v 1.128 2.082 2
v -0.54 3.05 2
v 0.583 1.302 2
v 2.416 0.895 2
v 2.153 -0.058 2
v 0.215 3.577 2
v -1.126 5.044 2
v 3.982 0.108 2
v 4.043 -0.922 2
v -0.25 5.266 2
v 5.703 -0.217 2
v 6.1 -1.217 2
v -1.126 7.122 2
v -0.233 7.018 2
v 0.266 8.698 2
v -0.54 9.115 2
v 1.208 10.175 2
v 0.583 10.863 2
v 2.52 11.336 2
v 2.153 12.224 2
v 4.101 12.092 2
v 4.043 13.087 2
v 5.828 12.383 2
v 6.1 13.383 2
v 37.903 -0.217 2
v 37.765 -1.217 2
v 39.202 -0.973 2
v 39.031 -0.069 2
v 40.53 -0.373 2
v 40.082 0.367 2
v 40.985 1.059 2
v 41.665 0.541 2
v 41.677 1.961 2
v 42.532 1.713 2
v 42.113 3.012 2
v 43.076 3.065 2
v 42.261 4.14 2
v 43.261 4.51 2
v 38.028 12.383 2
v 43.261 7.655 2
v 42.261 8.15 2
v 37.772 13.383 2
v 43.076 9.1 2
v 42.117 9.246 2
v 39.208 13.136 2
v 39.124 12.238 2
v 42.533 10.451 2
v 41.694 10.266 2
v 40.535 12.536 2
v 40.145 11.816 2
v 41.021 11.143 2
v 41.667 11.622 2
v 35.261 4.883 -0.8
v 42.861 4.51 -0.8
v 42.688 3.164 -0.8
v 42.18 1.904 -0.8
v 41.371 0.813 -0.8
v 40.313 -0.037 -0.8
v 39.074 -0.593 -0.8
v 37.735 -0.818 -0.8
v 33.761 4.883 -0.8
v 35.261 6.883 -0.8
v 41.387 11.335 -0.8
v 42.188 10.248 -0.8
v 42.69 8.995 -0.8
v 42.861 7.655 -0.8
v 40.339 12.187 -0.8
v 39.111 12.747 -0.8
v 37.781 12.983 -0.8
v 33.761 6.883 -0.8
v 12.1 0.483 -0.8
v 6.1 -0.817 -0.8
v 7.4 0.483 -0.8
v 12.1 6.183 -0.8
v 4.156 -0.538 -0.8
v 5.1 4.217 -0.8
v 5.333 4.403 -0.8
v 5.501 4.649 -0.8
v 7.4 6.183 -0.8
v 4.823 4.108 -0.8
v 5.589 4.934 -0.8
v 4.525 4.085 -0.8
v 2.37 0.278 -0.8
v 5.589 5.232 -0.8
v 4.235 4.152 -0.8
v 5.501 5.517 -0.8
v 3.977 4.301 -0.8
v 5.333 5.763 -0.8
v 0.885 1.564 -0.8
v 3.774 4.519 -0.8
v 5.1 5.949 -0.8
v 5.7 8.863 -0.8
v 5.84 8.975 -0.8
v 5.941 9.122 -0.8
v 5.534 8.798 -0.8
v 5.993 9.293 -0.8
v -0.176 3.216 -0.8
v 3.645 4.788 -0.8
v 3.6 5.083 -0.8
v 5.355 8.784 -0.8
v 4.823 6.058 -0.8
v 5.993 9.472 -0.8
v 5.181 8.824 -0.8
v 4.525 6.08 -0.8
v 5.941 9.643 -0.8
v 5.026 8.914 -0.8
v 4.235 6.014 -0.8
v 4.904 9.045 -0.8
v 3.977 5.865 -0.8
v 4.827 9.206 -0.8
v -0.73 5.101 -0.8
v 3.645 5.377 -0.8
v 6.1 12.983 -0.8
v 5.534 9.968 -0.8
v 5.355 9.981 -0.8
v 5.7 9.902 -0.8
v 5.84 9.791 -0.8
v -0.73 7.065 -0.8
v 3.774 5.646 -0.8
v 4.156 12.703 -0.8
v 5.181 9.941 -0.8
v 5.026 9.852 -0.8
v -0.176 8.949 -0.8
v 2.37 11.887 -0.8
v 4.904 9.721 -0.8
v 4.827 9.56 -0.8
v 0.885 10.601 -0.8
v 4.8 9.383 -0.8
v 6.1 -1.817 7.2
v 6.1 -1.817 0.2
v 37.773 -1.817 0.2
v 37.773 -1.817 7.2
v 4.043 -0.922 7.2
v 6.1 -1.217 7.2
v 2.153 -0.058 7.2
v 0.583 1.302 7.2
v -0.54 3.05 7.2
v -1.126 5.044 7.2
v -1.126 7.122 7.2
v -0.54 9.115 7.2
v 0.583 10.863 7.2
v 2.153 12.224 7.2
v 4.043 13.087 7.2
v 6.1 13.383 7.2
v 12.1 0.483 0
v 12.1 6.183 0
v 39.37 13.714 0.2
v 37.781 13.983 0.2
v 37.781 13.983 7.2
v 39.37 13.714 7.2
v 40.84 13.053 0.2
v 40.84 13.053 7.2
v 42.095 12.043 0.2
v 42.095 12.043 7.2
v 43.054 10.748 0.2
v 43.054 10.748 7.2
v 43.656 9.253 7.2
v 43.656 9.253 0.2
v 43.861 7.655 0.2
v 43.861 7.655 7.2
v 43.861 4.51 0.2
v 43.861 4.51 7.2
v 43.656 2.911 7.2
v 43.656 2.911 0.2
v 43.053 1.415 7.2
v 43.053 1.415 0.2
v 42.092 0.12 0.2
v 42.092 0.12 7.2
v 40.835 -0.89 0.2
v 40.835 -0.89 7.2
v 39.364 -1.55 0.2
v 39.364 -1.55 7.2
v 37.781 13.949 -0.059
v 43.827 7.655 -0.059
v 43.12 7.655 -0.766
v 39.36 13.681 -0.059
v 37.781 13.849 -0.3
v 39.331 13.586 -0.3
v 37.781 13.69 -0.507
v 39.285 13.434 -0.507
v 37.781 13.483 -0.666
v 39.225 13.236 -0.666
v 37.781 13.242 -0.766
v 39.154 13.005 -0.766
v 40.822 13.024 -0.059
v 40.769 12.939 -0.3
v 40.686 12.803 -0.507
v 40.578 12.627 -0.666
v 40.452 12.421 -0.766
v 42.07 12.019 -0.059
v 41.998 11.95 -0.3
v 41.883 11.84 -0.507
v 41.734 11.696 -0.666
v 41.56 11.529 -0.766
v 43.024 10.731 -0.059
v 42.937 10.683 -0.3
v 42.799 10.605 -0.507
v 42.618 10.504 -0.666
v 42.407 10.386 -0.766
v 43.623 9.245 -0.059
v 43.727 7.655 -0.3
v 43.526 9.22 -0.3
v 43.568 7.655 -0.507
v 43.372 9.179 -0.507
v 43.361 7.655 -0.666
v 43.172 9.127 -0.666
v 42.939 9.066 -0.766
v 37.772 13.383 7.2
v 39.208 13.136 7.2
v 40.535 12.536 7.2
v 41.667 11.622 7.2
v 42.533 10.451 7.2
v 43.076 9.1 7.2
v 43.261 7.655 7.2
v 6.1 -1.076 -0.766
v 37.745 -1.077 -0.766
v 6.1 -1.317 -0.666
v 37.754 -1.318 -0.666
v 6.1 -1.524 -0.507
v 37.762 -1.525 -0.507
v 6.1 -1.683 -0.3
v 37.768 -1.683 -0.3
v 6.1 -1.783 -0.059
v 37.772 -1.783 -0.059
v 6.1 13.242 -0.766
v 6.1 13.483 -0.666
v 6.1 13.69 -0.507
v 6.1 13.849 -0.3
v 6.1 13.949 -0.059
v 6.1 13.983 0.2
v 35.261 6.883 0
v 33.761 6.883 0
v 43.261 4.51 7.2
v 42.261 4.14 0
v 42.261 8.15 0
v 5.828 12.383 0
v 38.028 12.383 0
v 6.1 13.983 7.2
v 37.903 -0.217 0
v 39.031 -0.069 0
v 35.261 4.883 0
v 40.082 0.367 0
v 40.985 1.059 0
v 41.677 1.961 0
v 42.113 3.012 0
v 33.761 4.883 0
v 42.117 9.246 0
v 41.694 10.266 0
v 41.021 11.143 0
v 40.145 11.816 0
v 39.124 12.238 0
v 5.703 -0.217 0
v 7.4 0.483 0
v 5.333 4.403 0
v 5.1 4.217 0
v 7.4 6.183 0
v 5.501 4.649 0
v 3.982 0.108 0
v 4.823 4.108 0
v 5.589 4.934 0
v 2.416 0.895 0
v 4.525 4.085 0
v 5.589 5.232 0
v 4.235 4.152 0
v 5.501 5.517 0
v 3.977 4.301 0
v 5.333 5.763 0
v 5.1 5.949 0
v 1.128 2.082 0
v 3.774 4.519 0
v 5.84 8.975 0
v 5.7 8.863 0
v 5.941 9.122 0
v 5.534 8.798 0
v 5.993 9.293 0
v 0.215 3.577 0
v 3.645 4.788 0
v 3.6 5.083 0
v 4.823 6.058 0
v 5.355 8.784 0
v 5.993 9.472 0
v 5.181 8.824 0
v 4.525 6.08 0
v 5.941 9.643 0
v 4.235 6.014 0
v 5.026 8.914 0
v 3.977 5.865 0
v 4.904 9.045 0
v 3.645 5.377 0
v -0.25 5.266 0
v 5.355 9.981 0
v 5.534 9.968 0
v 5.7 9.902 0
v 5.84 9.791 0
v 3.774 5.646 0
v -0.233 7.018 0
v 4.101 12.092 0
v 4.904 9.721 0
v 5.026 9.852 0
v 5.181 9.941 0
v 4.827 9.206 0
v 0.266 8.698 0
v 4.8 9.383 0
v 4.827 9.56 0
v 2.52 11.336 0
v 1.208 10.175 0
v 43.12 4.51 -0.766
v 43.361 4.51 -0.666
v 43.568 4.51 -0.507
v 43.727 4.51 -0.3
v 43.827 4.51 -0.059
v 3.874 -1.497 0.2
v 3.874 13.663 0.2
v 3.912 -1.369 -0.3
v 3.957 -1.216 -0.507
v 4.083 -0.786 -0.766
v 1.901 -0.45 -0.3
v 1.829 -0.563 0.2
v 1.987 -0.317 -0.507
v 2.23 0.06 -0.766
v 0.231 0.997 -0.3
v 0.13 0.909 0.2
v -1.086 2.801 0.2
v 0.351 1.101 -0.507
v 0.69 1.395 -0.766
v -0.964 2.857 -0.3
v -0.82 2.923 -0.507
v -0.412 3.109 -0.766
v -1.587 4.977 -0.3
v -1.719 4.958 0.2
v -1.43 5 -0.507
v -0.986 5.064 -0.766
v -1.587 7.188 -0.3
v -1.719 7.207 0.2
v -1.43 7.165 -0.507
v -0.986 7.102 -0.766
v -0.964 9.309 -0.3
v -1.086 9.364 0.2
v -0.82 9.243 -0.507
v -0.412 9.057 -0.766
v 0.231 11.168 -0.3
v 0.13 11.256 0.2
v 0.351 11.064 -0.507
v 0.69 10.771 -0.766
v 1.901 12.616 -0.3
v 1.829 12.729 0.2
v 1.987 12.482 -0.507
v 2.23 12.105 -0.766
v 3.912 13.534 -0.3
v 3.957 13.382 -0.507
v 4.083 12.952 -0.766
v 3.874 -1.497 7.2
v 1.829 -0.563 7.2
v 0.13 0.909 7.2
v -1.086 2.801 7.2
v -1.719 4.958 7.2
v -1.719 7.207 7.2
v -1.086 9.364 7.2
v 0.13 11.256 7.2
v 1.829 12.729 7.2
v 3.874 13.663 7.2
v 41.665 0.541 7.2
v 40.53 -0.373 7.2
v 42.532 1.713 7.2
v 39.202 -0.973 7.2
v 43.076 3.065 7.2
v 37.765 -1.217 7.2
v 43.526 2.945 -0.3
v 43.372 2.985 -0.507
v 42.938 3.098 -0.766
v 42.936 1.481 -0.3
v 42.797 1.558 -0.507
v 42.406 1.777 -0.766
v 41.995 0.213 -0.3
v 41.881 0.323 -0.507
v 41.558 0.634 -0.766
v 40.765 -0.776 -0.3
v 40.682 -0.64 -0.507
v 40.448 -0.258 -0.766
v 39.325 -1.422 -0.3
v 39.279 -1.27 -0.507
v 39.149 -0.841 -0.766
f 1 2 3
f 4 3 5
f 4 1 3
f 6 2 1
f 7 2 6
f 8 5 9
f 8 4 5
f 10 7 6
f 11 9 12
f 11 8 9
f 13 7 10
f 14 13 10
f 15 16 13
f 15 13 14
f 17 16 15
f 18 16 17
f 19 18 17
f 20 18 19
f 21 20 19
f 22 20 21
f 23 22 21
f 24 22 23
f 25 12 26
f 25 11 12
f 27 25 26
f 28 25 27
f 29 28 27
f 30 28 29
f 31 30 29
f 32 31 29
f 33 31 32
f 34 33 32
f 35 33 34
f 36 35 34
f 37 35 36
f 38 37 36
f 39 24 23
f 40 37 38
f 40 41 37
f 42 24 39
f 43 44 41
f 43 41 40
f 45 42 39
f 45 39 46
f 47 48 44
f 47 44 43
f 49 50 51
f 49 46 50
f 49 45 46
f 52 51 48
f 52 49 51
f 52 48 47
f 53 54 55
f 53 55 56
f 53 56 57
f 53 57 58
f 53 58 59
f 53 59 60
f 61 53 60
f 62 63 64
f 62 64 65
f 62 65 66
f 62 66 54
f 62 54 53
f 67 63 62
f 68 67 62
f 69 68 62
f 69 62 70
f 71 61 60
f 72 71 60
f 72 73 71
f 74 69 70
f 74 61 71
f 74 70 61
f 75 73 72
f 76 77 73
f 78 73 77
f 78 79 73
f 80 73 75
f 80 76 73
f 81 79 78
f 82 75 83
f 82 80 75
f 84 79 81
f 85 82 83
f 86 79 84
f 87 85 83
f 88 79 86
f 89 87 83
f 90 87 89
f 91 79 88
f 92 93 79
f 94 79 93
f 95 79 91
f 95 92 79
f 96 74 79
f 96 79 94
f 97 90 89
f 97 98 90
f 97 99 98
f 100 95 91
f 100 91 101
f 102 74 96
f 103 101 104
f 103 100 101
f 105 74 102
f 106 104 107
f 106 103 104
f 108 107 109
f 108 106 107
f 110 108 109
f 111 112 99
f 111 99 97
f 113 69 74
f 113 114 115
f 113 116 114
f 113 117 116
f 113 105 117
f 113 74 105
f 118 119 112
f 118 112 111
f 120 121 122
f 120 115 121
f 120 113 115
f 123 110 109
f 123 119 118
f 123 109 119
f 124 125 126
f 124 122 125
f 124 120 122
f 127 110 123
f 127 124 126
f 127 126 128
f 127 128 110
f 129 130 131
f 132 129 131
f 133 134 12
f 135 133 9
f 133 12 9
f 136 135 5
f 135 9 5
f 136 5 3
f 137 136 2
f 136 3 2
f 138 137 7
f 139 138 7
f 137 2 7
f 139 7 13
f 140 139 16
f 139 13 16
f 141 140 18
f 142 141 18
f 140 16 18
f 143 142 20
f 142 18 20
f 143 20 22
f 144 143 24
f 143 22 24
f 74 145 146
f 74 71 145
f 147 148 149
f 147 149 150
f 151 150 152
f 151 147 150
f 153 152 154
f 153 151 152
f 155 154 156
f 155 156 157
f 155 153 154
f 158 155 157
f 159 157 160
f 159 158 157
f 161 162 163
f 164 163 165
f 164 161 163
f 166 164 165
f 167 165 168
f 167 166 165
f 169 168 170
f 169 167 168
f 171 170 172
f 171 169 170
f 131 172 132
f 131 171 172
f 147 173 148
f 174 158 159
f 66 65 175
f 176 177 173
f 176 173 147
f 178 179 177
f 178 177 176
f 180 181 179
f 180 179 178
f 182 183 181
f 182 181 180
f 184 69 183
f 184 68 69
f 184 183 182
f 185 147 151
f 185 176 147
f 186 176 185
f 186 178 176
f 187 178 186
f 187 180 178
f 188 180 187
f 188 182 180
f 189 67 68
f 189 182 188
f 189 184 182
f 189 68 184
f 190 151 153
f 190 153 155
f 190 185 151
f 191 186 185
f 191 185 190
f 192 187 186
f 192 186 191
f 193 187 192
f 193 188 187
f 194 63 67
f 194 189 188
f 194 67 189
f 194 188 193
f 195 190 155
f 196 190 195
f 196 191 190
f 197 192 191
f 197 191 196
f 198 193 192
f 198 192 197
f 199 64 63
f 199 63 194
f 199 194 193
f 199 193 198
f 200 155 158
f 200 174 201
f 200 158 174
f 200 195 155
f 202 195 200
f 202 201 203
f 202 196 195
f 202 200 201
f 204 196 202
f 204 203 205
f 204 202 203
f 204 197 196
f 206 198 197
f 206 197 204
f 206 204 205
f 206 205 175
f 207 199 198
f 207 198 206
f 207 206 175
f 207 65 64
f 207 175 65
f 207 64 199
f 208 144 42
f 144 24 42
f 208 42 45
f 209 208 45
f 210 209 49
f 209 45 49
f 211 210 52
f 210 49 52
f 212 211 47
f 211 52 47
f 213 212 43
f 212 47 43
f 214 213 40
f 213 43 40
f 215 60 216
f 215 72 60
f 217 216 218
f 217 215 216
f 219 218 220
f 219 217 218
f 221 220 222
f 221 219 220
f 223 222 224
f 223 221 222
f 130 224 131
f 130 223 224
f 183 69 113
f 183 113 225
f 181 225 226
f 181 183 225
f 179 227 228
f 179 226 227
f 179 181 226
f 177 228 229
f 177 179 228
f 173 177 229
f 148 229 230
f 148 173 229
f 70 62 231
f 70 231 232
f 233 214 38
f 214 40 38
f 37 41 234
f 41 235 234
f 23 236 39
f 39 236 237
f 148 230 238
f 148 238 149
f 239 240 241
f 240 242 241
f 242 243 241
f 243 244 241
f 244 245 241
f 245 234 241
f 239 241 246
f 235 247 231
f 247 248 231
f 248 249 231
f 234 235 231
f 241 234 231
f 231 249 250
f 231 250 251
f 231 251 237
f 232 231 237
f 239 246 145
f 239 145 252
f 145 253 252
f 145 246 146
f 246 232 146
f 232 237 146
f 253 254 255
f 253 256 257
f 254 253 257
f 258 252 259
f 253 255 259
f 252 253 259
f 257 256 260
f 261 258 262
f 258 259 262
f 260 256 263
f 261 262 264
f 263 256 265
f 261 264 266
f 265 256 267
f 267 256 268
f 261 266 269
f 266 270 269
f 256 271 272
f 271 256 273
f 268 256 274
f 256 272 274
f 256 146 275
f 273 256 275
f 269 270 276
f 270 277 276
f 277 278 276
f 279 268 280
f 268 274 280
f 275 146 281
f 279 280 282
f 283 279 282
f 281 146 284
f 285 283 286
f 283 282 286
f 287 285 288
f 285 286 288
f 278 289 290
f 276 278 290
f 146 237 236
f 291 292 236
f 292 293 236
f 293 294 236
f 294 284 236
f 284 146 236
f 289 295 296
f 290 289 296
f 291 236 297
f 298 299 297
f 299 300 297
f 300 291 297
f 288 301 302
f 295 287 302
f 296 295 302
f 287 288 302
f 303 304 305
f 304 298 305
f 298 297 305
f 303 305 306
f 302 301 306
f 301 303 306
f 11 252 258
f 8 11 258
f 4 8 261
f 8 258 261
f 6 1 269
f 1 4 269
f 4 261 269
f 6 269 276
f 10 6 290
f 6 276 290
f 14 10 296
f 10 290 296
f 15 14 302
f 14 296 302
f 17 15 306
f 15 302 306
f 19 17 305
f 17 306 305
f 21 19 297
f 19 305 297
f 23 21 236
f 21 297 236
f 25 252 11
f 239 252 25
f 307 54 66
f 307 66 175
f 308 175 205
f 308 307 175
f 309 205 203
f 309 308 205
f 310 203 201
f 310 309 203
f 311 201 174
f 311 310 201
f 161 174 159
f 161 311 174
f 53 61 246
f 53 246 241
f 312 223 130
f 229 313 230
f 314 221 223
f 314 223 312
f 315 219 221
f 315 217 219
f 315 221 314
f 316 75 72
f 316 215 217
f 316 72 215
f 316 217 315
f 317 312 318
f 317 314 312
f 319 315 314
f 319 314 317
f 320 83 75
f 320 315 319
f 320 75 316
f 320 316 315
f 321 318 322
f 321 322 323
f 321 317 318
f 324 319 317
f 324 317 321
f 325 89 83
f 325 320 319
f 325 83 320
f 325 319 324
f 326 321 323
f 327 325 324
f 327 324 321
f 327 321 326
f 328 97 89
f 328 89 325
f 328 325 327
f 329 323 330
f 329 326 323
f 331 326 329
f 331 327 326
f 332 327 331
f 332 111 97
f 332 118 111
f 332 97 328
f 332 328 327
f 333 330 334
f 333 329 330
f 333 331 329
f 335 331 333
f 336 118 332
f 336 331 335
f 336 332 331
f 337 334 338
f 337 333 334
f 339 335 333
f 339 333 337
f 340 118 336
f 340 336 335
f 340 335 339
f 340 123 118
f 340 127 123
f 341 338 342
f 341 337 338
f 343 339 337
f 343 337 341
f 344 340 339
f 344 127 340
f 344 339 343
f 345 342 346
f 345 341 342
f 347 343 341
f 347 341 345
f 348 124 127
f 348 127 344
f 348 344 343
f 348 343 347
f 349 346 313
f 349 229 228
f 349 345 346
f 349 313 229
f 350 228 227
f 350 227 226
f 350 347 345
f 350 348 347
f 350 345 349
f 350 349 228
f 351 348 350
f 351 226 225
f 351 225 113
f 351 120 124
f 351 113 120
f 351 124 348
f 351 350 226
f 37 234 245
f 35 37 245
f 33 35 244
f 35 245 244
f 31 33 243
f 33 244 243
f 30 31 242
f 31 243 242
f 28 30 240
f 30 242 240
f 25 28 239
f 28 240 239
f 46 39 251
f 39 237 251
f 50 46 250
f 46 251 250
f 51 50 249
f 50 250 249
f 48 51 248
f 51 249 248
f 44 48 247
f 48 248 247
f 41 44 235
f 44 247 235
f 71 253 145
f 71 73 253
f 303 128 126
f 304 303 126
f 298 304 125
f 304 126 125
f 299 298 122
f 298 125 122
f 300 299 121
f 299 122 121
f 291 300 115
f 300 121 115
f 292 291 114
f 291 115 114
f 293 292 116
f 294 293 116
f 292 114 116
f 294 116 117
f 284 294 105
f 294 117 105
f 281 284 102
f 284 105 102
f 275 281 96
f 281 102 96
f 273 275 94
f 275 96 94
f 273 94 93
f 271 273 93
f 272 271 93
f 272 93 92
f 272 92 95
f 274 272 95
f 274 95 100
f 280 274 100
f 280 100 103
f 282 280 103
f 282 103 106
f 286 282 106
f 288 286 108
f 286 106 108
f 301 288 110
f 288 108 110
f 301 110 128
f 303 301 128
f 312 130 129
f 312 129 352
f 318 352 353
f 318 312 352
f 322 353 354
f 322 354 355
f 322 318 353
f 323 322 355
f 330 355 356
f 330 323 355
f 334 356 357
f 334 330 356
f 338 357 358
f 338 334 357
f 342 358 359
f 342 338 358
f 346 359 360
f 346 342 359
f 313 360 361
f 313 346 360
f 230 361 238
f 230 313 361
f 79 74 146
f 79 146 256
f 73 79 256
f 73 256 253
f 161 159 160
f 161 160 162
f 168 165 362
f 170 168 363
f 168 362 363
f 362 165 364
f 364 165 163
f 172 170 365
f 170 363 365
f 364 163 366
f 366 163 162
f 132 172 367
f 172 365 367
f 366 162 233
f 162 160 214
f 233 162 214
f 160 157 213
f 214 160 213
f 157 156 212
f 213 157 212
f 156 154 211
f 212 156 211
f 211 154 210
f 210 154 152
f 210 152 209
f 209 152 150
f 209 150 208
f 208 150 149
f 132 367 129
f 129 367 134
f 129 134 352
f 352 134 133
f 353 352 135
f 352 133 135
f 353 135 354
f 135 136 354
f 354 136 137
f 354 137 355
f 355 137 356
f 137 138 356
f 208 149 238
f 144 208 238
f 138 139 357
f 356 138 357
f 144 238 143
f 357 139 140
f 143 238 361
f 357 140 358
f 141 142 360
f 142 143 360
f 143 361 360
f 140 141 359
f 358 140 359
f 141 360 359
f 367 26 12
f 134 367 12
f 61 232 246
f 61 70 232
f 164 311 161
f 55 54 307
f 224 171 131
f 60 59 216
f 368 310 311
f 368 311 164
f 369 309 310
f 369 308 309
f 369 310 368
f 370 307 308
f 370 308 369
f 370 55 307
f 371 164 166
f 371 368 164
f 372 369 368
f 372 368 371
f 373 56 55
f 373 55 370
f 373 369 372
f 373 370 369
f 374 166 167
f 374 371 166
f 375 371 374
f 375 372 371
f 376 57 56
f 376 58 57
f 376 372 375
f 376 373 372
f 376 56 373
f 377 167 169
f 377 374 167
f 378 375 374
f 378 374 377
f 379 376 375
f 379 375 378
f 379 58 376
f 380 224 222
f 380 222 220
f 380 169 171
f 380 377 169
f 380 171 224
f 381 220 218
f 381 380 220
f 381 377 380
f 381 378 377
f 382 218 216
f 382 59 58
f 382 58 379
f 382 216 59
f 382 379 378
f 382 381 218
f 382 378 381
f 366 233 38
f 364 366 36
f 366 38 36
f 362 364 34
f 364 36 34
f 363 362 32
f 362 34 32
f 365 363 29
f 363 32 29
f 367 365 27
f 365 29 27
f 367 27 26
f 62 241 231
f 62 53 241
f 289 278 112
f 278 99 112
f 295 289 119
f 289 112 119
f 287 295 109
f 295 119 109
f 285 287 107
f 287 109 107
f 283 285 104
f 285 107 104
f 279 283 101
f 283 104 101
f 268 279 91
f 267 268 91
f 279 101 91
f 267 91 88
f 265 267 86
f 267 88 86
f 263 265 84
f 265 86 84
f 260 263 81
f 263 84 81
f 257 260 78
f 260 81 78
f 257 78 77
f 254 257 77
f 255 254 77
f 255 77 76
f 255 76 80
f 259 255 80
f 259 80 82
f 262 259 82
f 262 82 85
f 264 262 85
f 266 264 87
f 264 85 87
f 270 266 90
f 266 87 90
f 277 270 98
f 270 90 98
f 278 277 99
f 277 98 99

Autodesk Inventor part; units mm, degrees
ref_plane "YZ Plane" through (0, 0, 0) normal (1, 0, 0) x (0, 1, 0)
ref_plane "XZ Plane" through (0, 0, 0) normal (0, 1, 0) x (-1, 0, 0)
ref_plane "XY Plane" through (0, 0, 0) normal (0, 0, 1) x (1, 0, 0)
sketch "Эскиз1" plane through (0, 0, 0) normal (0, 0, 1) x (1, 0, 0)
  arc A0 (37.9034, -0.2173) -> (42.261, 4.1403) centre (37.9034, 4.1403) ccw
  arc A1 (42.261, 8.15) -> (38.0283, 12.3827) centre (38.0283, 8.15) ccw
  arc A2 (43.261, 7.6552) -> (37.7725, 13.3827) centre (37.5283, 7.6552) ccw
  arc A3 (37.765, -1.2173) -> (43.261, 4.5105) centre (37.5283, 4.5105) ccw
  line L0 (37.765, -1.2173) -> (6.1001, -1.2173)
  line L1 (5.7034, -0.2173) -> (37.9034, -0.2173)
  line L2 (5.8283, 12.3827) -> (5.7034, -0.2173) construction
  arc A4 (5.8283, 12.3827) -> (5.7034, -0.2173) centre (6.0021, 6.0803) ccw
  arc A5 (6.1001, 13.3827) -> (6.1001, -1.2173) centre (6.1001, 6.0827) ccw
  line L3 (5.8283, 12.3827) -> (38.0283, 12.3827)
  line L4 (5.8283, 12.3827) -> (18.4289, 12.3827) construction
  line L5 (37.7725, 13.3827) -> (6.1001, 13.3827)
  line L6 (42.261, 8.15) -> (42.261, 4.1403)
  line L7 (43.261, 7.6552) -> (43.261, 4.5105)
  point P0 (0, 0)
  point P1 (0, 0)
  point P2 (0, 0)
  dimension "d10" = 1.5
  dimension "d0" = 90.568
  dimension "d1" = 4.2327
  dimension "d2" = 5.7327
  dimension "d3" = 5.7327
  dimension "d4" = 1
  dimension "d5" = 1
  dimension "d6" = 12.6
  dimension "d7" = 32.2
  dimension "d8" = 32.2
  dimension "d9" = 1
extrude "main_walls" add sketch "Эскиз1" along normal blind 2
sketch "Эскиз2" plane through (0, 0, 0) normal (0, 0, -1) x (-1, 0, 0)
  line L0 (-6.1001, 13.3827) -> (-37.7725, 13.3827) projected
  arc A0 (-37.7725, 13.3827) -> (-43.261, 7.6552) centre (-37.5283, 7.6552) ccw projected
  line L1 (-43.261, 7.6552) -> (-43.261, 4.5105) projected
  arc A1 (-43.261, 4.5105) -> (-37.765, -1.2173) centre (-37.5283, 4.5105) ccw projected
  line L2 (-37.765, -1.2173) -> (-6.1001, -1.2173) projected
  arc A2 (-6.1001, -1.2173) -> (-6.1001, 13.3827) centre (-6.1001, 6.0827) ccw projected
  point P0 (0, 0)
extrude "top" add sketch "Эскиз2" along normal blind 0.8
sketch "Эскиз3" plane through (0, 0, -0.8) normal (0, 0, -1) x (-1, 0, 0)
  line L0 (-6.1001, 13.3827) -> (-37.7725, 13.3827) projected
  arc A0 (-37.7725, 13.3827) -> (-43.261, 7.6552) centre (-37.5283, 7.6552) ccw projected
  line L1 (-43.261, 7.6552) -> (-43.261, 4.5105) projected
  arc A1 (-43.261, 4.5105) -> (-37.765, -1.2173) centre (-37.5283, 4.5105) ccw projected
  line L2 (-37.765, -1.2173) -> (-6.1001, -1.2173) projected
  arc A2 (-6.1001, -1.2173) -> (-6.1001, 13.3827) centre (-6.1001, 6.0827) ccw projected
  line L3 (1.1999, -1.8994) -> (1.1999, 13.1826)
  line L4 (-7.4001, 0.4827) -> (-12.1001, 0.4827)
  line L5 (-12.1001, 0.4827) -> (-12.1001, 6.1827)
  line L6 (-12.1001, 6.1827) -> (-7.4001, 6.1827)
  line L7 (-7.4001, 6.1827) -> (-7.4001, 0.4827)
  circle A3 centre (-4.6001, 5.0827) radius 1
  circle A4 centre (-5.4001, 9.3827) radius 0.6
  line L8 (-33.761, 4.8827) -> (-35.261, 4.8827)
  line L9 (-35.261, 4.8827) -> (-35.261, 6.8827)
  line L10 (-35.261, 6.8827) -> (-33.761, 6.8827)
  line L11 (-33.761, 6.8827) -> (-33.761, 4.8827)
  point P0 (0, 0)
  dimension "d15" = 4.7
  dimension "d16" = 5.7
  dimension "d17" = 1.7
  dimension "d18" = 2
  dimension "d19" = 1.2
  dimension "d20" = 5.8
  dimension "d21" = 2.8
  dimension "d22" = 6.3
  dimension "d23" = 4
  dimension "d24" = 0.8
  dimension "d25" = 1.5
  dimension "d26" = 2
  dimension "d27" = 6.1
  dimension "d28" = 8
extrude "Выдавливание5" cut sketch "Эскиз3" against normal blind 1.8 contours L4 L5 L6 L7 | A3 | A4 | L8 L9 L10 L11
sketch "Эскиз8" plane through (0, 0, -0.8) normal (0, 0, -1) x (-1, 0, 0)
  line L0 (-33.761, 6.8827) -> (-33.761, 4.8827) projected
  line L1 (-33.761, 4.8827) -> (-35.261, 4.8827) projected
  line L2 (-35.261, 4.8827) -> (-35.261, 6.8827) projected
  line L3 (-35.261, 6.8827) -> (-33.761, 6.8827) projected
  circle A0 centre (-4.6001, 5.0827) radius 1 projected
  circle A1 centre (-5.4001, 9.3827) radius 0.6 projected
  line L4 (-7.4001, 6.1827) -> (-7.4001, 0.4827) projected
  line L5 (-7.4001, 0.4827) -> (-12.1001, 0.4827) projected
  line L6 (-12.1001, 0.4827) -> (-12.1001, 6.1827) projected
  line L7 (-12.1001, 6.1827) -> (-7.4001, 6.1827) projected
  line L8 (-6.1001, 13.3827) -> (-37.7725, 13.3827) projected
  arc A2 (-37.7725, 13.3827) -> (-43.261, 7.6552) centre (-37.5283, 7.6552) ccw projected
  line L9 (-43.261, 7.6552) -> (-43.261, 4.5105) projected
  arc A3 (-43.261, 4.5105) -> (-37.765, -1.2173) centre (-37.5283, 4.5105) ccw projected
  line L10 (-37.765, -1.2173) -> (-6.1001, -1.2173) projected
  arc A4 (-6.1001, -1.2173) -> (-6.1001, 13.3827) centre (-6.1001, 6.0827) ccw projected
  arc A5 (-6.1001, -1.8173) -> (-6.1001, 13.9827) centre (-6.1001, 6.0827) ccw
  line L11 (-6.1001, 13.9827) -> (-37.7813, 13.9827)
  line L12 (-6.1001, -1.8173) -> (-37.7733, -1.8173)
  arc A6 (-43.8609, 4.5105) -> (-37.7733, -1.8173) centre (-37.5283, 4.5105) ccw
  arc A7 (-37.7813, 13.9827) -> (-43.8609, 7.6552) centre (-37.5283, 7.6552) ccw
  line L13 (-43.8609, 7.6552) -> (-43.8609, 4.5105)
  point P0 (0, 0)
  dimension "d73" = 7.3
  dimension "d74" = 7.9
extrude "Выдавливание8" add sketch "Эскиз8" against normal blind 8 contours L12 A6 L13 A7 L11 A5
fillet "Сопряжение3" radius 1 6 edges at (-1.7999, 6.0827, -0.8) (21.9407, 13.9827, -0.8) (21.9367, -1.8173, -0.8) (42.0919, 0.1202, -0.8) (42.0947, 12.0426, -0.8) (43.8609, 6.0828, -0.8)
equation "\"d2\" = d1 + d10"
equation "\"d3\" = d1 + d10"
equation "\"d5\" = d4"
equation "\"d7\" = d8"
equation "\"d9\" = d4"
properties part number "top"
